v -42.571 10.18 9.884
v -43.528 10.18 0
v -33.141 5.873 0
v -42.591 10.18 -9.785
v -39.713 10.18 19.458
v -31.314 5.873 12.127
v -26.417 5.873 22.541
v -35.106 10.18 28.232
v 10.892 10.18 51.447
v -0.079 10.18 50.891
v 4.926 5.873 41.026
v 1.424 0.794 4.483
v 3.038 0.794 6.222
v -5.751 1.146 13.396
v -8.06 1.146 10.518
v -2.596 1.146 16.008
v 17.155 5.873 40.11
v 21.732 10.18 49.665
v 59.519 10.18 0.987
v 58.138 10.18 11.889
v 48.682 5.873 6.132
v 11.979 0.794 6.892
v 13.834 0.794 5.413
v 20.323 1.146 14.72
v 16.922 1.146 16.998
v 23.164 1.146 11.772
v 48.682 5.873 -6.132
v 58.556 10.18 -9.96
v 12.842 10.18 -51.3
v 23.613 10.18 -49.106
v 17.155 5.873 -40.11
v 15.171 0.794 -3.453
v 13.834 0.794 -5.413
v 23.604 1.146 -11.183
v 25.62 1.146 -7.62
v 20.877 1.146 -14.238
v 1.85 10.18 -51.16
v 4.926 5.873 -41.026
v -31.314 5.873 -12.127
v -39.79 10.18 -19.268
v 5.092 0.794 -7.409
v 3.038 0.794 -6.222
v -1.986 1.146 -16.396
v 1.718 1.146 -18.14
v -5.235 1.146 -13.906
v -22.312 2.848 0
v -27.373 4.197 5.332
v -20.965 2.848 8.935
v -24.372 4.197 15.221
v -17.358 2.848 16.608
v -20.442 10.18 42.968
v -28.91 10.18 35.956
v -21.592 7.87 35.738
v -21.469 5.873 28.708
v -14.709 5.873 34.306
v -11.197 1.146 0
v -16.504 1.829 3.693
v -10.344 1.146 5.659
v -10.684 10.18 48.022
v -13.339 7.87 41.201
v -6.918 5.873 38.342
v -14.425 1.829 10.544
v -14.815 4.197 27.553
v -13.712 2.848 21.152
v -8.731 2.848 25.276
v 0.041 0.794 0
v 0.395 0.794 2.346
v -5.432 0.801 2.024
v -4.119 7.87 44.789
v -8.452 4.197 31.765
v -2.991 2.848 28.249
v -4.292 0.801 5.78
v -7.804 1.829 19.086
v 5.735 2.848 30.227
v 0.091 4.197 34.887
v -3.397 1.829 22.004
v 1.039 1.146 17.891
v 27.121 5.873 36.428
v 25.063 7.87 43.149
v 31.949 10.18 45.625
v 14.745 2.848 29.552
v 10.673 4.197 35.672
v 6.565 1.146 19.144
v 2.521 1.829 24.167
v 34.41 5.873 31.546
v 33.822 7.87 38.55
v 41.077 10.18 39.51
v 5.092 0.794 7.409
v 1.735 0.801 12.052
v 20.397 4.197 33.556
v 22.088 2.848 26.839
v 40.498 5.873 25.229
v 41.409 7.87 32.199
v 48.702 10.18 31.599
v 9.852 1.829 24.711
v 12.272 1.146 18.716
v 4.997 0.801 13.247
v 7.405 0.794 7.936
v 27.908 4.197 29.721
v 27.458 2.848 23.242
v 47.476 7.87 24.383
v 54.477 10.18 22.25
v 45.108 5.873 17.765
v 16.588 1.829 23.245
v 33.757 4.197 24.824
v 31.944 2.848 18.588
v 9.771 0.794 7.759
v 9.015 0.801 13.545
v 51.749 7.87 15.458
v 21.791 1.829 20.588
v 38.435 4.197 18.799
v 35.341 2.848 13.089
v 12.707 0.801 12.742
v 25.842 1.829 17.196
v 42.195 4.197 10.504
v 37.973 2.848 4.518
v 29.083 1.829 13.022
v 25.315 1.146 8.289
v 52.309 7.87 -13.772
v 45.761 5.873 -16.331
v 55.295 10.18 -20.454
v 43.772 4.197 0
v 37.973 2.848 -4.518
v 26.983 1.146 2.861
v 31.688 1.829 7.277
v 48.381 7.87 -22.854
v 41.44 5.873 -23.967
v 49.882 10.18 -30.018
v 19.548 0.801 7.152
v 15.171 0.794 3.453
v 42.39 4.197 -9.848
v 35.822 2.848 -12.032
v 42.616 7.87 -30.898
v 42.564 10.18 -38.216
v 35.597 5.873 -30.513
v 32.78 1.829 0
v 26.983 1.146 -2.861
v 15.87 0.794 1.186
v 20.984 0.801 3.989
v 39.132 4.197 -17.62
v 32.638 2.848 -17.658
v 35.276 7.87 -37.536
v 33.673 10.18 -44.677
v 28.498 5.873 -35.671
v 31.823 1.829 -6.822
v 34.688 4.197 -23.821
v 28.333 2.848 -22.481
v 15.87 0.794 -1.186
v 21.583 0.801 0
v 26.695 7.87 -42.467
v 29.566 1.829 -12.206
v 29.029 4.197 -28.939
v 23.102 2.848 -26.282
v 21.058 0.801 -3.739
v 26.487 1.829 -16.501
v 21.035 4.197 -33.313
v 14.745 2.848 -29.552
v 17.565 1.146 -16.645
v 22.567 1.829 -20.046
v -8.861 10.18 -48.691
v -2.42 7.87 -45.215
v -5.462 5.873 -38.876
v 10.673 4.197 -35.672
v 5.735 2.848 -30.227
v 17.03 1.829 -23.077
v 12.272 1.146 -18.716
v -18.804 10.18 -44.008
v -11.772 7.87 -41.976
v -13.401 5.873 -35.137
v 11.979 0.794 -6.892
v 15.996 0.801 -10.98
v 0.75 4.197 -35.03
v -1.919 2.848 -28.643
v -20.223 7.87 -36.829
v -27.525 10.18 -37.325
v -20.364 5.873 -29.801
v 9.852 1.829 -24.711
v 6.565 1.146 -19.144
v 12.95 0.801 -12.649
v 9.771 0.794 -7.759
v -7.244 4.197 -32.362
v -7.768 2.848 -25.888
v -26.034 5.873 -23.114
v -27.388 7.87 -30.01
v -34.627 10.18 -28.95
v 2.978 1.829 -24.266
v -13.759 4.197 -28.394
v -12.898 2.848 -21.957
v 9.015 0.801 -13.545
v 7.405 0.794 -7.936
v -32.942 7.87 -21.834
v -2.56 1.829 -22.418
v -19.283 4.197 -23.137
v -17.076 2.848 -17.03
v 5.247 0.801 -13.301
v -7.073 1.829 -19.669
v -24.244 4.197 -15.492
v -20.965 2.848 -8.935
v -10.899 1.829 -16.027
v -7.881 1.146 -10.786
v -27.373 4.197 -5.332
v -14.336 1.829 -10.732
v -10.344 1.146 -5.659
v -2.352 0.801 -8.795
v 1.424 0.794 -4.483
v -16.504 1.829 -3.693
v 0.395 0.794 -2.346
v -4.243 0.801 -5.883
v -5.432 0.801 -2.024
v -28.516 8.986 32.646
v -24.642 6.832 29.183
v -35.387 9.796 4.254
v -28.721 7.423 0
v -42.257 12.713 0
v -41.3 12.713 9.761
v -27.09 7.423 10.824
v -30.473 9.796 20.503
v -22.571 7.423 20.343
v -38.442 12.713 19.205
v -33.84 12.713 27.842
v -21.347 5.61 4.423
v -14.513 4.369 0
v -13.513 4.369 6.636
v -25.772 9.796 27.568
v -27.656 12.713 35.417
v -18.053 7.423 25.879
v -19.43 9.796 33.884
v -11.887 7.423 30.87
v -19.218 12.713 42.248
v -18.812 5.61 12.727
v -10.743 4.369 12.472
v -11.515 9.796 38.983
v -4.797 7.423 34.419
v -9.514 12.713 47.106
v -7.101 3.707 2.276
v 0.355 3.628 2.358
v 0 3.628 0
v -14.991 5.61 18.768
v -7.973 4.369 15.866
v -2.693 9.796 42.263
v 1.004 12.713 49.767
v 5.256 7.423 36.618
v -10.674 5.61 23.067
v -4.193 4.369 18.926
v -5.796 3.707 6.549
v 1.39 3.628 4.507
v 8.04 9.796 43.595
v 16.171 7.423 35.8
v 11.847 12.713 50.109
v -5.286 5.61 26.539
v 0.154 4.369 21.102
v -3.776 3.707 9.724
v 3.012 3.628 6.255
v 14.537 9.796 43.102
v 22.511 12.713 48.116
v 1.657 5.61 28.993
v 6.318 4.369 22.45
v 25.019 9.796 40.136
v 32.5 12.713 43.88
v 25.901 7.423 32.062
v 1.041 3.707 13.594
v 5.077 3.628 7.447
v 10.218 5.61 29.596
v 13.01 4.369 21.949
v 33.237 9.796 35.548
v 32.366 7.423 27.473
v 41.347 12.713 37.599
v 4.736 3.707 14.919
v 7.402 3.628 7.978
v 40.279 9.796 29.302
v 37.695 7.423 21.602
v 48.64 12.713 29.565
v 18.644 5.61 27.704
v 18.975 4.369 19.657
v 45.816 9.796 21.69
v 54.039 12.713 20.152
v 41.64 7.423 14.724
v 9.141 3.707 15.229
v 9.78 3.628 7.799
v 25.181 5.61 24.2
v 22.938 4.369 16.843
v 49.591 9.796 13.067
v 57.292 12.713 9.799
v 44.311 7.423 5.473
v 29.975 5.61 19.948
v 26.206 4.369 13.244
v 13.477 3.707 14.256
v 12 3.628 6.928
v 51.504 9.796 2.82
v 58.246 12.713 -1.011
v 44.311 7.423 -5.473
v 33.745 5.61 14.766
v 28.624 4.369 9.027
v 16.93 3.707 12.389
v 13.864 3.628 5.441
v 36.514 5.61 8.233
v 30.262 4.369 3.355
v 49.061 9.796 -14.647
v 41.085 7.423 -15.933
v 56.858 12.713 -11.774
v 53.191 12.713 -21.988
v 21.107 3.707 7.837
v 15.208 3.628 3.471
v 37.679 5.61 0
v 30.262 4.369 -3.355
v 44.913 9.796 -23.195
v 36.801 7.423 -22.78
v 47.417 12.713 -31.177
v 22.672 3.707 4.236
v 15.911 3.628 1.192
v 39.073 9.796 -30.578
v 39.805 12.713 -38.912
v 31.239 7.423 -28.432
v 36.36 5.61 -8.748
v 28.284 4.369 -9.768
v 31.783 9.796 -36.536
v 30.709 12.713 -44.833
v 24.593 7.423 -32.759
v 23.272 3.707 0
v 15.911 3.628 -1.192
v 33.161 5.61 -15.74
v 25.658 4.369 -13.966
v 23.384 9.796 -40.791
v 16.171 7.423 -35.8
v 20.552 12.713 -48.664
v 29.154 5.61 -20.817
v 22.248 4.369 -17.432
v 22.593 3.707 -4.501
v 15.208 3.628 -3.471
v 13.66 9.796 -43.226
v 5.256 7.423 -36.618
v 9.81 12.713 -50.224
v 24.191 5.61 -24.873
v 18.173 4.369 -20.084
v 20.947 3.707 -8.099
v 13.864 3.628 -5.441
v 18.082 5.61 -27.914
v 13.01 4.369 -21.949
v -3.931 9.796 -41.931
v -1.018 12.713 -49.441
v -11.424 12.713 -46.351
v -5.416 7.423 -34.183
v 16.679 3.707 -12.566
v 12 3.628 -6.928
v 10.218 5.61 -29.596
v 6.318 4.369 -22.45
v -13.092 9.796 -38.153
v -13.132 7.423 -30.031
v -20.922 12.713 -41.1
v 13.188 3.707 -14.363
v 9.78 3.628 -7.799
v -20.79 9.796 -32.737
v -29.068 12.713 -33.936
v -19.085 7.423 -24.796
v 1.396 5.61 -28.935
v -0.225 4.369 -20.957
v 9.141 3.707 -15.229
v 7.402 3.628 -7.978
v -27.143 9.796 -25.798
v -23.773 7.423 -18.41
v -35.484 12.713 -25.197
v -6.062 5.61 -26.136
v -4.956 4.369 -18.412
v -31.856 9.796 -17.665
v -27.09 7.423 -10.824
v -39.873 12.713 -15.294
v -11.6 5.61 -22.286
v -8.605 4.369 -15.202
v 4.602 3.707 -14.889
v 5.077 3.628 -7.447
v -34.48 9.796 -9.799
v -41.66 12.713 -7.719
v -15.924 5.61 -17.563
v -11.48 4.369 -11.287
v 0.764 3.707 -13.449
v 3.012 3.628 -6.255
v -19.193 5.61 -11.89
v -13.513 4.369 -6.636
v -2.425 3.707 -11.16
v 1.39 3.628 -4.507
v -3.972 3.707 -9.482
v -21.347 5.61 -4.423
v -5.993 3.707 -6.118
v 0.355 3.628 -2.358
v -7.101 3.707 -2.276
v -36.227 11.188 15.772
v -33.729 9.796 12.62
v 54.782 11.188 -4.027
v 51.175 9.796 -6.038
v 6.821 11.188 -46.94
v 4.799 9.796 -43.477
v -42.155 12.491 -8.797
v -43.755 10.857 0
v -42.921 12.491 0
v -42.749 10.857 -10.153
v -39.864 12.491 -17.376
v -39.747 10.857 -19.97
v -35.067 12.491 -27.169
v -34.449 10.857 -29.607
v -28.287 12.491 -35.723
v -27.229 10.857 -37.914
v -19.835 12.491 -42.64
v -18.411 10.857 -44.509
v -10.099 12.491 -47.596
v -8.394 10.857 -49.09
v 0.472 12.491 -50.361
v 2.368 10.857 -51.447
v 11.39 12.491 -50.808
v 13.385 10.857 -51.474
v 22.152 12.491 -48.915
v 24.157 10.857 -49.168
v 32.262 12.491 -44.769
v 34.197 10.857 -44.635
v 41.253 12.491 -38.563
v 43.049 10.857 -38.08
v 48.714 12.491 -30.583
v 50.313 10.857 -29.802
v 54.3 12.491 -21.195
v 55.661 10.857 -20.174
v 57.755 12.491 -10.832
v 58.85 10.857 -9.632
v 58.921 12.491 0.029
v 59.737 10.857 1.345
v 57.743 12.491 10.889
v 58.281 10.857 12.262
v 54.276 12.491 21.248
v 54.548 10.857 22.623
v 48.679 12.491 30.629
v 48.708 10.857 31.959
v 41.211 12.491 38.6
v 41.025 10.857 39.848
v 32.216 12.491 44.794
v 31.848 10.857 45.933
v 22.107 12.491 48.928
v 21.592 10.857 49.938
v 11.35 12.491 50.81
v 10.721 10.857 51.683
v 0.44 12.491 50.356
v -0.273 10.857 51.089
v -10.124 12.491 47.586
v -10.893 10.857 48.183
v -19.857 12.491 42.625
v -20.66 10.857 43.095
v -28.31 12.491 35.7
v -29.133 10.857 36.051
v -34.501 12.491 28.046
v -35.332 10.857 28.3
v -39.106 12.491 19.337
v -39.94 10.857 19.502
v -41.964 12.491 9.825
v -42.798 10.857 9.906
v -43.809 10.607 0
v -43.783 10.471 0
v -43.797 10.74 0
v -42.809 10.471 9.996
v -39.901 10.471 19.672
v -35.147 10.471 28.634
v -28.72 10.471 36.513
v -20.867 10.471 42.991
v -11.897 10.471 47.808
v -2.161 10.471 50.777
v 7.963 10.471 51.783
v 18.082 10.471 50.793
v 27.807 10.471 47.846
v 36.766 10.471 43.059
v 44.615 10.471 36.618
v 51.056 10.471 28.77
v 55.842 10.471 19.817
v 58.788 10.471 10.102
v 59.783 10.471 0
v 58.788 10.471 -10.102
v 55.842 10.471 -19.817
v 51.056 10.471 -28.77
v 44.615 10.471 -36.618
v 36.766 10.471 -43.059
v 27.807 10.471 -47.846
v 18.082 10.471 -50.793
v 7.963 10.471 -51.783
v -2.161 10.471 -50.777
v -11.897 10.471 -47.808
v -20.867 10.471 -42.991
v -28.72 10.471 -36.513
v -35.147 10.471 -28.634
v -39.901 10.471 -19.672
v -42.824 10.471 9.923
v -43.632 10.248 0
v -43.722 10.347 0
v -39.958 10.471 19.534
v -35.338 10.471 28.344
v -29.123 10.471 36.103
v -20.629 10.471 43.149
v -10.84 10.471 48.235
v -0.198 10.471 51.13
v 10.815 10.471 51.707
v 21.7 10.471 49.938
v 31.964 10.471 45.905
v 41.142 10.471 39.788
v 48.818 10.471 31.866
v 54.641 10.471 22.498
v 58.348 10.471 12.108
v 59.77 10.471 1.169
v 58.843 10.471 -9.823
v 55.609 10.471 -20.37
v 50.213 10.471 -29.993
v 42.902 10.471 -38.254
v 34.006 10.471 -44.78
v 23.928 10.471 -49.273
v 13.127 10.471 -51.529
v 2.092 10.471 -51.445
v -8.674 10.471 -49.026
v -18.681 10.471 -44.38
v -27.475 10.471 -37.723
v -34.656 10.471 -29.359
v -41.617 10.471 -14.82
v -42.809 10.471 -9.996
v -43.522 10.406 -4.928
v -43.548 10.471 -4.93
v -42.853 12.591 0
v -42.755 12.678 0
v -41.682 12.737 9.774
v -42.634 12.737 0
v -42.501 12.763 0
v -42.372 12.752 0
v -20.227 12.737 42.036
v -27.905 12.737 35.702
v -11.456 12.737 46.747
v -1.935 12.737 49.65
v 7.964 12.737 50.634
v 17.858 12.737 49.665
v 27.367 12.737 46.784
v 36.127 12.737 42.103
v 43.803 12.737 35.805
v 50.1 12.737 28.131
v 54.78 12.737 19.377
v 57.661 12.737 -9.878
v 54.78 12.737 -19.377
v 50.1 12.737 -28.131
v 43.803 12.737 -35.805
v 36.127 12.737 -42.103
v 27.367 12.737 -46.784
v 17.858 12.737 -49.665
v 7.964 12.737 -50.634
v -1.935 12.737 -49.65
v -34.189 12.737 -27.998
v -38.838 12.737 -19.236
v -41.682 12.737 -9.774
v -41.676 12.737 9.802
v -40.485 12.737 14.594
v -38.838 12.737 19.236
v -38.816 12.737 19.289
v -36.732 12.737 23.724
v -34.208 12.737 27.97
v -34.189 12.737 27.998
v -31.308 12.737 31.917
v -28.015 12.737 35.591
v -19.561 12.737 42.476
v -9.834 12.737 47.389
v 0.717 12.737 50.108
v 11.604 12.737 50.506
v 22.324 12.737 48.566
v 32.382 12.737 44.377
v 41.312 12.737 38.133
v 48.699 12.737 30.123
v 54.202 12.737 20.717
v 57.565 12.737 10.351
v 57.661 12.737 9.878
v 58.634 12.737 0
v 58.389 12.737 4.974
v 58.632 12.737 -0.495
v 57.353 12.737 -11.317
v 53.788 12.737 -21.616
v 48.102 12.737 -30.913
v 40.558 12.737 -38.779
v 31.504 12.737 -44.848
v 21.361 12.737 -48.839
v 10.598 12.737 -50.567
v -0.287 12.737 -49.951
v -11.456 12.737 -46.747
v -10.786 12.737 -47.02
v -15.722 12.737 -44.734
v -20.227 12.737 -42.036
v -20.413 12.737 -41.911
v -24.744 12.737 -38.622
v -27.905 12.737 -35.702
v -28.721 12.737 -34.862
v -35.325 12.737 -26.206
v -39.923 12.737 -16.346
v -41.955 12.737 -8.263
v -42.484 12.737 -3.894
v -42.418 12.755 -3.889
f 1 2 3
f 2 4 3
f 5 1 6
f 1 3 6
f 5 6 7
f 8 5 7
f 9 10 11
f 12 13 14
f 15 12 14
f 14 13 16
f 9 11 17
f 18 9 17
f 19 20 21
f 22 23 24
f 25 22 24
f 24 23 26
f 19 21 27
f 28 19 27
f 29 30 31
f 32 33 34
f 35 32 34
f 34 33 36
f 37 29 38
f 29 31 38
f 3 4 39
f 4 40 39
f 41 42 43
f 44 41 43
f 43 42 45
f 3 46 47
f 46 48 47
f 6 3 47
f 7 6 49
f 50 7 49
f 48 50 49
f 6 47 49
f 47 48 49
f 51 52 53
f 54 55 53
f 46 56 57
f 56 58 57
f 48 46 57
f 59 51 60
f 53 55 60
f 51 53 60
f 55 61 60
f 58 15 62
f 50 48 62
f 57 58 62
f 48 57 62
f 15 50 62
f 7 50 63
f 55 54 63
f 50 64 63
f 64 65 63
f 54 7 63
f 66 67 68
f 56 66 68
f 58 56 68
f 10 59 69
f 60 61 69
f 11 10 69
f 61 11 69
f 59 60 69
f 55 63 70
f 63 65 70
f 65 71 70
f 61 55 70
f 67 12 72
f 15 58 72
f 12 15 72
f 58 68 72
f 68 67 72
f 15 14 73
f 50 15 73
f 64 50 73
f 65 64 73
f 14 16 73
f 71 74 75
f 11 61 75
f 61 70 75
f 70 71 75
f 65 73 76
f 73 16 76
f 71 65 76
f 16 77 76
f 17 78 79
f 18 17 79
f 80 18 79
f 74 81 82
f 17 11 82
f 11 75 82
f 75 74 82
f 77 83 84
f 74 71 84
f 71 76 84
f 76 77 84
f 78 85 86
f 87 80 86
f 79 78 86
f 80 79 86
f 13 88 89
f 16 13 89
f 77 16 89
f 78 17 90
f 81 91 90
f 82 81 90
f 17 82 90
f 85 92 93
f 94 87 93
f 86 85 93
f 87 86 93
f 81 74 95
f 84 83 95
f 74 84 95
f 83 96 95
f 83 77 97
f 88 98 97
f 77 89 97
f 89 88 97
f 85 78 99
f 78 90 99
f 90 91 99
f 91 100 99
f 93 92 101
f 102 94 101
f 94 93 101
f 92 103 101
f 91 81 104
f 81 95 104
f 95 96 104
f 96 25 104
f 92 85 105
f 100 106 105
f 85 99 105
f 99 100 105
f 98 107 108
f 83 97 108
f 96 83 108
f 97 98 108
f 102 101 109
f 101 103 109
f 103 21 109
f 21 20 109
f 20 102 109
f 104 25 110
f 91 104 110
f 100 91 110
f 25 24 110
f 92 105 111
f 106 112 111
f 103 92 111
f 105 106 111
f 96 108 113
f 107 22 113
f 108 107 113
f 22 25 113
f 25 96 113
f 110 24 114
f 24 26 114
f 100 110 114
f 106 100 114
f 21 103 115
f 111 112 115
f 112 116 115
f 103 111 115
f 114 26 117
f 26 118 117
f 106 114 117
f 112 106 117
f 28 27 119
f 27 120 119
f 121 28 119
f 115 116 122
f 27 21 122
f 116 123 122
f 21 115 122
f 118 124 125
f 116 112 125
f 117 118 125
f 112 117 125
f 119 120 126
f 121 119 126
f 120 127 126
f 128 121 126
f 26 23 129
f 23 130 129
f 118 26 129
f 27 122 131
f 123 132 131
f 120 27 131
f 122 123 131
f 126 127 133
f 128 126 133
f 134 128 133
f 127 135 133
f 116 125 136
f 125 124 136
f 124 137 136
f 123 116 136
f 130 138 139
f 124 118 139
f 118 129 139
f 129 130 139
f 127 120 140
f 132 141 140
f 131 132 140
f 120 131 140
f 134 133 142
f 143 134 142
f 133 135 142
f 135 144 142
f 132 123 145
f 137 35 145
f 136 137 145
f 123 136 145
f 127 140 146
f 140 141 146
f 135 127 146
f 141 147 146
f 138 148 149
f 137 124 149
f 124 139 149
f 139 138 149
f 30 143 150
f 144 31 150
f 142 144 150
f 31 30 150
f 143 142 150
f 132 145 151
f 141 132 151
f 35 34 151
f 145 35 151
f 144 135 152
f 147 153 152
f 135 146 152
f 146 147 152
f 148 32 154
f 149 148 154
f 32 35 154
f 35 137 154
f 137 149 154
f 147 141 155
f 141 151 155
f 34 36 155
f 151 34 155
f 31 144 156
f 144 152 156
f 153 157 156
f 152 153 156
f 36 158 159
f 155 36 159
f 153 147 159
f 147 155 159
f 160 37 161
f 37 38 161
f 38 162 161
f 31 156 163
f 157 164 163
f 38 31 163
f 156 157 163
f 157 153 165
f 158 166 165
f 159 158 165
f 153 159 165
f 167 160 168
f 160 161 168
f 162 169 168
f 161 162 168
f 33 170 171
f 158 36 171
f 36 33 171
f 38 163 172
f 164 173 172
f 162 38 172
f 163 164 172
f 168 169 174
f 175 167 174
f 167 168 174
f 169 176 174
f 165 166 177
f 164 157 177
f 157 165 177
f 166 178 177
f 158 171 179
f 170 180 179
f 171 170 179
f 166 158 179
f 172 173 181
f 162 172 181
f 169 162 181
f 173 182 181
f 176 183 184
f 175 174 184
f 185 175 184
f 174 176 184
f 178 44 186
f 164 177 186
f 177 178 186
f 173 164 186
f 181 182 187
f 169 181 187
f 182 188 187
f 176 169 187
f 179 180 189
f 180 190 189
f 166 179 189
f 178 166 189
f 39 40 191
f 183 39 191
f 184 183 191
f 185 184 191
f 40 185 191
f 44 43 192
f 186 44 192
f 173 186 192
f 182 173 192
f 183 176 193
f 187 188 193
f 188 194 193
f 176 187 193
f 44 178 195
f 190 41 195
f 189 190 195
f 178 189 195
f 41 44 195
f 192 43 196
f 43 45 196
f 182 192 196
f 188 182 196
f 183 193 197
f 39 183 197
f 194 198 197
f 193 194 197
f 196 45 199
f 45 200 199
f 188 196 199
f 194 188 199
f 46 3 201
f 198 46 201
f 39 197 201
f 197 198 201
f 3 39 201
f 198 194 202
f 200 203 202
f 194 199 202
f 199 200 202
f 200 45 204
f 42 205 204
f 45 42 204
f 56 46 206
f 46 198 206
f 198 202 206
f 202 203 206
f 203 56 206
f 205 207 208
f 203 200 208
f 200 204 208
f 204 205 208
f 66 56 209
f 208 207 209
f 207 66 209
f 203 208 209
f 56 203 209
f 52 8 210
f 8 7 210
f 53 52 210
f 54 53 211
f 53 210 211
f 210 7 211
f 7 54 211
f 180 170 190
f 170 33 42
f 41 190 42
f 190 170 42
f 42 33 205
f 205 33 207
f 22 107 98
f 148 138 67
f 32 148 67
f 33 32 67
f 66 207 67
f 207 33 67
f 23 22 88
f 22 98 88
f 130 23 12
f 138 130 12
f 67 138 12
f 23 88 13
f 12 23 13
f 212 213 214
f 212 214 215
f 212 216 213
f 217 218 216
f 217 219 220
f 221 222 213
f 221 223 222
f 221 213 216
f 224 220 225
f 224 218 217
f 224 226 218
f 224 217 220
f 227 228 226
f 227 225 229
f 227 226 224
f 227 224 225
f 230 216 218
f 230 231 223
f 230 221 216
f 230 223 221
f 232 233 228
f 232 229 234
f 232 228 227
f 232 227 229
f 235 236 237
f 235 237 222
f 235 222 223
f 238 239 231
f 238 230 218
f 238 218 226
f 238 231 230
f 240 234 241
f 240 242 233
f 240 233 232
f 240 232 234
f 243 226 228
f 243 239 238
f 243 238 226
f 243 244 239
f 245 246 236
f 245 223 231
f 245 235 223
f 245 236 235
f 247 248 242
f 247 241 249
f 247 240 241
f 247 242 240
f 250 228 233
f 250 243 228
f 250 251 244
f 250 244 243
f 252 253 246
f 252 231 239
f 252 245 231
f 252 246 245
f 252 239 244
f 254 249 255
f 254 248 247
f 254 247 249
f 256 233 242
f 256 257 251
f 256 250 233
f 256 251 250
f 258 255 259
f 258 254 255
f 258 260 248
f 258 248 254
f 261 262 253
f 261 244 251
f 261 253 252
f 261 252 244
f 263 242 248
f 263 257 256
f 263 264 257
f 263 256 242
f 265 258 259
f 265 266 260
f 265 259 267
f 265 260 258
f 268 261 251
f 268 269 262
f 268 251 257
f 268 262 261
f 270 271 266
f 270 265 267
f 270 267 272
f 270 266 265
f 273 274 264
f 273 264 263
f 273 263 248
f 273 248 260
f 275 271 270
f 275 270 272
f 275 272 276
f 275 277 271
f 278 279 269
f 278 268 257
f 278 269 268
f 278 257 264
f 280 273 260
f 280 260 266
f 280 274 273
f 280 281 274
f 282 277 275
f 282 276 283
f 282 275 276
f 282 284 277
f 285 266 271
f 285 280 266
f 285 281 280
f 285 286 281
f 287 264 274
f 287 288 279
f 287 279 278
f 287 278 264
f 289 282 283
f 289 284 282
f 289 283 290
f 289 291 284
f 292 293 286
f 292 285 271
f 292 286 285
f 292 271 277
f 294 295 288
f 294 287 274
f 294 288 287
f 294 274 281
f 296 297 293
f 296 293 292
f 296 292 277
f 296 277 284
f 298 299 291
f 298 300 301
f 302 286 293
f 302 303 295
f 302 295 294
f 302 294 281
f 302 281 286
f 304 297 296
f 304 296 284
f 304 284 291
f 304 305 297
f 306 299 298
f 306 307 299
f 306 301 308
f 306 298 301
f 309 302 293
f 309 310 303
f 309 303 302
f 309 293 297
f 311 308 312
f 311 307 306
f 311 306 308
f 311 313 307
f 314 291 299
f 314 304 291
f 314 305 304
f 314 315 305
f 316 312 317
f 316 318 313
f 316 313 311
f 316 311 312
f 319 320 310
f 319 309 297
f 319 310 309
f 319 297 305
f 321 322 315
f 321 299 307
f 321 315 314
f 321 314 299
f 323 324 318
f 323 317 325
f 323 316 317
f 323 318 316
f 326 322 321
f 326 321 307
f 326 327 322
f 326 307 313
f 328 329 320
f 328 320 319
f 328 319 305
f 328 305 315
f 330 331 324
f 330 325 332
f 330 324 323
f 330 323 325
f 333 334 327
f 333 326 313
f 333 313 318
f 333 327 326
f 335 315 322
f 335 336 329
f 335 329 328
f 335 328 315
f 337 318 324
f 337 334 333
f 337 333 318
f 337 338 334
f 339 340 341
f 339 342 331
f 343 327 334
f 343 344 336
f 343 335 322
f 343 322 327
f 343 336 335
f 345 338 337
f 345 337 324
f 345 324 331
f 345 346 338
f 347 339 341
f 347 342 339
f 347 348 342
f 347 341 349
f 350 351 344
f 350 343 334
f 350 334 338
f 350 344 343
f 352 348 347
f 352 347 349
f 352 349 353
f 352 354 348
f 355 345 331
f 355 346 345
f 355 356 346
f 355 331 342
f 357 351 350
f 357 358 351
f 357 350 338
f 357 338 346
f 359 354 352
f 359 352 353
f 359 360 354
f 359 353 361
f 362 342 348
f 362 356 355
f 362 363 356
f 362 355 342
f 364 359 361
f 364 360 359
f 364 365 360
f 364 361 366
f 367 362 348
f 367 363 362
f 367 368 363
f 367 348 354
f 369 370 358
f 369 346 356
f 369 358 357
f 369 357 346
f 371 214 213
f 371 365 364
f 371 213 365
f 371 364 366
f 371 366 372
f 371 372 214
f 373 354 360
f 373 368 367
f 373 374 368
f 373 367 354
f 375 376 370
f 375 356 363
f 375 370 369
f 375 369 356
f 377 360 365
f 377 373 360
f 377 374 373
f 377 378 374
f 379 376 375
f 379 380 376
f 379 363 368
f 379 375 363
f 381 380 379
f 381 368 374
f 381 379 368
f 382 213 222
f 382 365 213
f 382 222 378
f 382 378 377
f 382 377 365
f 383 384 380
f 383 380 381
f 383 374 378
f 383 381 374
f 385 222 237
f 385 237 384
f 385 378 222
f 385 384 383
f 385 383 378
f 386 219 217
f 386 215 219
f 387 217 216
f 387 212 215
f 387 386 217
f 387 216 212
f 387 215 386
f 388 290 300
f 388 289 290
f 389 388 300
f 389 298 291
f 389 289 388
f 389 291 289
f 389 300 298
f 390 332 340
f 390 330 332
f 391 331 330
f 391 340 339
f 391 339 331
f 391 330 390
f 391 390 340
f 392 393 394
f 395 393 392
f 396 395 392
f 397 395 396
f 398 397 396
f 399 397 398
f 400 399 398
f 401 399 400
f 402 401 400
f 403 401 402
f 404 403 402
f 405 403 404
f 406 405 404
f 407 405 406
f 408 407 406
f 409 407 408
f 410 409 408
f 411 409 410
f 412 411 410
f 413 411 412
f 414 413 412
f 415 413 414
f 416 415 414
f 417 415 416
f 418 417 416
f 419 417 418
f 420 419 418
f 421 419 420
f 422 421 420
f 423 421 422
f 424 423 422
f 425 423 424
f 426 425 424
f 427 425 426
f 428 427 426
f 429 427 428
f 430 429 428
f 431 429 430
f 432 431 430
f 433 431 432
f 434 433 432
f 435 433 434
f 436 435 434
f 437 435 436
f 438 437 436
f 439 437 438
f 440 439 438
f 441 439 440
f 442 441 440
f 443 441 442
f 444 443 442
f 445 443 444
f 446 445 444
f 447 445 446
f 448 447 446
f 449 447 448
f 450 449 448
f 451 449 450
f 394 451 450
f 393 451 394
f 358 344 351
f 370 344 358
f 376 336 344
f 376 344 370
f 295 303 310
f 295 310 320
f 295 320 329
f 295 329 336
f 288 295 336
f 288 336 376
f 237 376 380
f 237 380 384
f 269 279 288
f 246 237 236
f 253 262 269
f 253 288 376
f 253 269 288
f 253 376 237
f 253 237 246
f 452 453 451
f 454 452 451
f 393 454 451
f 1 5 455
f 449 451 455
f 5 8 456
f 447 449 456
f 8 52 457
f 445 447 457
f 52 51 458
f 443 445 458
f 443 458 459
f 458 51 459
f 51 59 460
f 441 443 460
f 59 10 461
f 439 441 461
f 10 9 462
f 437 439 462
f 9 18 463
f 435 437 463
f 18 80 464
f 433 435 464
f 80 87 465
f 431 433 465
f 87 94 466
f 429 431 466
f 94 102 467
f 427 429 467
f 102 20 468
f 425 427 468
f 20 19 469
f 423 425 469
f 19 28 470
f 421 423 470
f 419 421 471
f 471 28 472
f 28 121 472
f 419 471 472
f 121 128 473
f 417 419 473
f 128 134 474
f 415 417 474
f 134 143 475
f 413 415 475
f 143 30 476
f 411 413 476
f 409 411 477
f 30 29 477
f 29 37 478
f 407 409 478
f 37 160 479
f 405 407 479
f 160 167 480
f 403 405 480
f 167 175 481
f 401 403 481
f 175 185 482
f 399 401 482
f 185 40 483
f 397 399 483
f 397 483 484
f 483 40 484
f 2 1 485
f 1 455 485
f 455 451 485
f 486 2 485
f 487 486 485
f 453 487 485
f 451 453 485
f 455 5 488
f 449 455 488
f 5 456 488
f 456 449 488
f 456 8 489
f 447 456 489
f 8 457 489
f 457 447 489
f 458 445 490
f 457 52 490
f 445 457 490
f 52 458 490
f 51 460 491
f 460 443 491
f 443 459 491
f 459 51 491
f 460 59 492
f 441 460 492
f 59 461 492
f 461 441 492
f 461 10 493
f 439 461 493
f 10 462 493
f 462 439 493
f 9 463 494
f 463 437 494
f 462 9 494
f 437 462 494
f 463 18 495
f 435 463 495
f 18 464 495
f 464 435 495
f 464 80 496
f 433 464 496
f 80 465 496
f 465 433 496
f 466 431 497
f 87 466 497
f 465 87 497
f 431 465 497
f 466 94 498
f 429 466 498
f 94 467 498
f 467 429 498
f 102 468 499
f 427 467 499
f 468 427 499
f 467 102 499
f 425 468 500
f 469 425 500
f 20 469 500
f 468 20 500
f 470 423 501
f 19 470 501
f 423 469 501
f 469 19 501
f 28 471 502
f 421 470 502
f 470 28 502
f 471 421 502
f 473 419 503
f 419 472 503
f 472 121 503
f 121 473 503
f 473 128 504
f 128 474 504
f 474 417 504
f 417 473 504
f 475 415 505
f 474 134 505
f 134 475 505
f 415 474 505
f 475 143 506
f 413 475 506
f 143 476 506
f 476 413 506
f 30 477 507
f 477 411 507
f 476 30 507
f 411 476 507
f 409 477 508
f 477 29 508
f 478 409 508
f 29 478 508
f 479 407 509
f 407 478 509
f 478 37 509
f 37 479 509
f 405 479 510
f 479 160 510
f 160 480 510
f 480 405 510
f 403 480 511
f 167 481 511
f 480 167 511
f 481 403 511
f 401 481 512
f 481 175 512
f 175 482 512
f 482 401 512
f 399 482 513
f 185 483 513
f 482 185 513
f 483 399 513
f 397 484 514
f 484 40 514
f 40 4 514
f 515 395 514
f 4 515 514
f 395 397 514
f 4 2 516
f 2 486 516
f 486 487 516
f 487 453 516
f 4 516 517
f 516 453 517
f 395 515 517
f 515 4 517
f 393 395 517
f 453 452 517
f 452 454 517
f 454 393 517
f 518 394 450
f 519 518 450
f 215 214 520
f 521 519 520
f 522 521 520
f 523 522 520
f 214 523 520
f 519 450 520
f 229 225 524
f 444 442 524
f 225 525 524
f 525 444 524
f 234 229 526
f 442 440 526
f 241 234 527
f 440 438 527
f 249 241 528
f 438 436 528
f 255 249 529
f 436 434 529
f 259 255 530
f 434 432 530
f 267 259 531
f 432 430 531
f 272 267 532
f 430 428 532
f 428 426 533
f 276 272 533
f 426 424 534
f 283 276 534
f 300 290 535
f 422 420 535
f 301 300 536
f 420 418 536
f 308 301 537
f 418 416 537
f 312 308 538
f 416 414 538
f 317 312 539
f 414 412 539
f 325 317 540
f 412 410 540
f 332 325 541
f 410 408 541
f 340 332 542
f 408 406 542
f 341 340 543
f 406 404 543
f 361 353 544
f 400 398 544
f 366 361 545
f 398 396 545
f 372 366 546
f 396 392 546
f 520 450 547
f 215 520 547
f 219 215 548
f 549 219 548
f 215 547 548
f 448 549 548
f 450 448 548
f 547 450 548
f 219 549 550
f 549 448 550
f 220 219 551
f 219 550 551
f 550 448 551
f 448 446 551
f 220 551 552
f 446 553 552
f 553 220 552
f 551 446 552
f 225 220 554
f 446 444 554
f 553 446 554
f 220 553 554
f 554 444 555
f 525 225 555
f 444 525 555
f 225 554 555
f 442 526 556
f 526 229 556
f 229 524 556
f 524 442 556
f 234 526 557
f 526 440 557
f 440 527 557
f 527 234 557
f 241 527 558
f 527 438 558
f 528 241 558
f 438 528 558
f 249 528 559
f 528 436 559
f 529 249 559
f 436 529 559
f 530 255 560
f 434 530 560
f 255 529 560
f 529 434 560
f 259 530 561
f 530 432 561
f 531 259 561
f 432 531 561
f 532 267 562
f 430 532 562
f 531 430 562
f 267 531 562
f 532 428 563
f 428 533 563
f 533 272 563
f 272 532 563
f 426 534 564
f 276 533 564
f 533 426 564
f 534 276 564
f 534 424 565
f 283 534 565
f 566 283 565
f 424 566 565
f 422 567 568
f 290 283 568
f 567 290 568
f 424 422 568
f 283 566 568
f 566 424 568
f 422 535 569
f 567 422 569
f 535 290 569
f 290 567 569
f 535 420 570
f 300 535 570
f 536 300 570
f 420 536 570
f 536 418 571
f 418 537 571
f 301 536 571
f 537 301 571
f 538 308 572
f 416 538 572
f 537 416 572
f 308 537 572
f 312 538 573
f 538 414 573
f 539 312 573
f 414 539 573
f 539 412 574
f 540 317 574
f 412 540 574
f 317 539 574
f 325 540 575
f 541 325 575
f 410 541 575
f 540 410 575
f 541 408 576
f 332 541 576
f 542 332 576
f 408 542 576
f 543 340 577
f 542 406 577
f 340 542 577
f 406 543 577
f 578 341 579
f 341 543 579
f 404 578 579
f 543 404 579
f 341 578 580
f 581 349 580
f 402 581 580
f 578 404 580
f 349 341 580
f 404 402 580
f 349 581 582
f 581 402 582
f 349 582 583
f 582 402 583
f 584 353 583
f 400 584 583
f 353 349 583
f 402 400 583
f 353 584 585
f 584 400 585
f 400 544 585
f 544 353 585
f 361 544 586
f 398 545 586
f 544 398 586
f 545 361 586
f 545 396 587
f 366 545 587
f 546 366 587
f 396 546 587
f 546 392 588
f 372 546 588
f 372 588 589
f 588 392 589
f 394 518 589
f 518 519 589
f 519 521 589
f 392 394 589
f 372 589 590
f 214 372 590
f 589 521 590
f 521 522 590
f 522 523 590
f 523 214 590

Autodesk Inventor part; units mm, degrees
ref_plane "YZ Plane" through (0, 0, 0) normal (1, 0, 0) x (0, 1, 0)
ref_plane "XZ Plane" through (0, 0, 0) normal (0, 1, 0) x (-1, 0, 0)
ref_plane "XY Plane" through (0, 0, 0) normal (0, 0, 1) x (1, 0, 0)
sketch "스케치1" plane through (0, 0, 0) normal (0, 0, 1) x (1, 0, 0)
  line L0 (0, 3.6283) -> (8, 3.6283)
  arc A0 (-42.6971, 12.9288) -> (0, 3.6283) centre (-2.6602, 94.0741) ccw
  arc A1 (-43.9855, 10.4041) -> (0.0413, 0.7941) centre (-2.6602, 94.0741) ccw
  line L1 (0.0413, 0.7941) -> (8, 0.7941)
  line L2 (-43.9855, 10.4041) -> (-42.6971, 12.9288)
  line L3 (8, 0.7941) -> (8, 3.6283)
  point P0 (0, 0)
  dimension "d0" = 8
revolve "회전1" add sketch "스케치1" angle 360 about axis through (8, 0.7941, 0) along (0, 1, 0)
fillet "모깎기1" radius 0.5 2 edges at (58.6971, 12.9288, 0) (59.9855, 10.4041, 0)
properties part number "240516_cup2"
